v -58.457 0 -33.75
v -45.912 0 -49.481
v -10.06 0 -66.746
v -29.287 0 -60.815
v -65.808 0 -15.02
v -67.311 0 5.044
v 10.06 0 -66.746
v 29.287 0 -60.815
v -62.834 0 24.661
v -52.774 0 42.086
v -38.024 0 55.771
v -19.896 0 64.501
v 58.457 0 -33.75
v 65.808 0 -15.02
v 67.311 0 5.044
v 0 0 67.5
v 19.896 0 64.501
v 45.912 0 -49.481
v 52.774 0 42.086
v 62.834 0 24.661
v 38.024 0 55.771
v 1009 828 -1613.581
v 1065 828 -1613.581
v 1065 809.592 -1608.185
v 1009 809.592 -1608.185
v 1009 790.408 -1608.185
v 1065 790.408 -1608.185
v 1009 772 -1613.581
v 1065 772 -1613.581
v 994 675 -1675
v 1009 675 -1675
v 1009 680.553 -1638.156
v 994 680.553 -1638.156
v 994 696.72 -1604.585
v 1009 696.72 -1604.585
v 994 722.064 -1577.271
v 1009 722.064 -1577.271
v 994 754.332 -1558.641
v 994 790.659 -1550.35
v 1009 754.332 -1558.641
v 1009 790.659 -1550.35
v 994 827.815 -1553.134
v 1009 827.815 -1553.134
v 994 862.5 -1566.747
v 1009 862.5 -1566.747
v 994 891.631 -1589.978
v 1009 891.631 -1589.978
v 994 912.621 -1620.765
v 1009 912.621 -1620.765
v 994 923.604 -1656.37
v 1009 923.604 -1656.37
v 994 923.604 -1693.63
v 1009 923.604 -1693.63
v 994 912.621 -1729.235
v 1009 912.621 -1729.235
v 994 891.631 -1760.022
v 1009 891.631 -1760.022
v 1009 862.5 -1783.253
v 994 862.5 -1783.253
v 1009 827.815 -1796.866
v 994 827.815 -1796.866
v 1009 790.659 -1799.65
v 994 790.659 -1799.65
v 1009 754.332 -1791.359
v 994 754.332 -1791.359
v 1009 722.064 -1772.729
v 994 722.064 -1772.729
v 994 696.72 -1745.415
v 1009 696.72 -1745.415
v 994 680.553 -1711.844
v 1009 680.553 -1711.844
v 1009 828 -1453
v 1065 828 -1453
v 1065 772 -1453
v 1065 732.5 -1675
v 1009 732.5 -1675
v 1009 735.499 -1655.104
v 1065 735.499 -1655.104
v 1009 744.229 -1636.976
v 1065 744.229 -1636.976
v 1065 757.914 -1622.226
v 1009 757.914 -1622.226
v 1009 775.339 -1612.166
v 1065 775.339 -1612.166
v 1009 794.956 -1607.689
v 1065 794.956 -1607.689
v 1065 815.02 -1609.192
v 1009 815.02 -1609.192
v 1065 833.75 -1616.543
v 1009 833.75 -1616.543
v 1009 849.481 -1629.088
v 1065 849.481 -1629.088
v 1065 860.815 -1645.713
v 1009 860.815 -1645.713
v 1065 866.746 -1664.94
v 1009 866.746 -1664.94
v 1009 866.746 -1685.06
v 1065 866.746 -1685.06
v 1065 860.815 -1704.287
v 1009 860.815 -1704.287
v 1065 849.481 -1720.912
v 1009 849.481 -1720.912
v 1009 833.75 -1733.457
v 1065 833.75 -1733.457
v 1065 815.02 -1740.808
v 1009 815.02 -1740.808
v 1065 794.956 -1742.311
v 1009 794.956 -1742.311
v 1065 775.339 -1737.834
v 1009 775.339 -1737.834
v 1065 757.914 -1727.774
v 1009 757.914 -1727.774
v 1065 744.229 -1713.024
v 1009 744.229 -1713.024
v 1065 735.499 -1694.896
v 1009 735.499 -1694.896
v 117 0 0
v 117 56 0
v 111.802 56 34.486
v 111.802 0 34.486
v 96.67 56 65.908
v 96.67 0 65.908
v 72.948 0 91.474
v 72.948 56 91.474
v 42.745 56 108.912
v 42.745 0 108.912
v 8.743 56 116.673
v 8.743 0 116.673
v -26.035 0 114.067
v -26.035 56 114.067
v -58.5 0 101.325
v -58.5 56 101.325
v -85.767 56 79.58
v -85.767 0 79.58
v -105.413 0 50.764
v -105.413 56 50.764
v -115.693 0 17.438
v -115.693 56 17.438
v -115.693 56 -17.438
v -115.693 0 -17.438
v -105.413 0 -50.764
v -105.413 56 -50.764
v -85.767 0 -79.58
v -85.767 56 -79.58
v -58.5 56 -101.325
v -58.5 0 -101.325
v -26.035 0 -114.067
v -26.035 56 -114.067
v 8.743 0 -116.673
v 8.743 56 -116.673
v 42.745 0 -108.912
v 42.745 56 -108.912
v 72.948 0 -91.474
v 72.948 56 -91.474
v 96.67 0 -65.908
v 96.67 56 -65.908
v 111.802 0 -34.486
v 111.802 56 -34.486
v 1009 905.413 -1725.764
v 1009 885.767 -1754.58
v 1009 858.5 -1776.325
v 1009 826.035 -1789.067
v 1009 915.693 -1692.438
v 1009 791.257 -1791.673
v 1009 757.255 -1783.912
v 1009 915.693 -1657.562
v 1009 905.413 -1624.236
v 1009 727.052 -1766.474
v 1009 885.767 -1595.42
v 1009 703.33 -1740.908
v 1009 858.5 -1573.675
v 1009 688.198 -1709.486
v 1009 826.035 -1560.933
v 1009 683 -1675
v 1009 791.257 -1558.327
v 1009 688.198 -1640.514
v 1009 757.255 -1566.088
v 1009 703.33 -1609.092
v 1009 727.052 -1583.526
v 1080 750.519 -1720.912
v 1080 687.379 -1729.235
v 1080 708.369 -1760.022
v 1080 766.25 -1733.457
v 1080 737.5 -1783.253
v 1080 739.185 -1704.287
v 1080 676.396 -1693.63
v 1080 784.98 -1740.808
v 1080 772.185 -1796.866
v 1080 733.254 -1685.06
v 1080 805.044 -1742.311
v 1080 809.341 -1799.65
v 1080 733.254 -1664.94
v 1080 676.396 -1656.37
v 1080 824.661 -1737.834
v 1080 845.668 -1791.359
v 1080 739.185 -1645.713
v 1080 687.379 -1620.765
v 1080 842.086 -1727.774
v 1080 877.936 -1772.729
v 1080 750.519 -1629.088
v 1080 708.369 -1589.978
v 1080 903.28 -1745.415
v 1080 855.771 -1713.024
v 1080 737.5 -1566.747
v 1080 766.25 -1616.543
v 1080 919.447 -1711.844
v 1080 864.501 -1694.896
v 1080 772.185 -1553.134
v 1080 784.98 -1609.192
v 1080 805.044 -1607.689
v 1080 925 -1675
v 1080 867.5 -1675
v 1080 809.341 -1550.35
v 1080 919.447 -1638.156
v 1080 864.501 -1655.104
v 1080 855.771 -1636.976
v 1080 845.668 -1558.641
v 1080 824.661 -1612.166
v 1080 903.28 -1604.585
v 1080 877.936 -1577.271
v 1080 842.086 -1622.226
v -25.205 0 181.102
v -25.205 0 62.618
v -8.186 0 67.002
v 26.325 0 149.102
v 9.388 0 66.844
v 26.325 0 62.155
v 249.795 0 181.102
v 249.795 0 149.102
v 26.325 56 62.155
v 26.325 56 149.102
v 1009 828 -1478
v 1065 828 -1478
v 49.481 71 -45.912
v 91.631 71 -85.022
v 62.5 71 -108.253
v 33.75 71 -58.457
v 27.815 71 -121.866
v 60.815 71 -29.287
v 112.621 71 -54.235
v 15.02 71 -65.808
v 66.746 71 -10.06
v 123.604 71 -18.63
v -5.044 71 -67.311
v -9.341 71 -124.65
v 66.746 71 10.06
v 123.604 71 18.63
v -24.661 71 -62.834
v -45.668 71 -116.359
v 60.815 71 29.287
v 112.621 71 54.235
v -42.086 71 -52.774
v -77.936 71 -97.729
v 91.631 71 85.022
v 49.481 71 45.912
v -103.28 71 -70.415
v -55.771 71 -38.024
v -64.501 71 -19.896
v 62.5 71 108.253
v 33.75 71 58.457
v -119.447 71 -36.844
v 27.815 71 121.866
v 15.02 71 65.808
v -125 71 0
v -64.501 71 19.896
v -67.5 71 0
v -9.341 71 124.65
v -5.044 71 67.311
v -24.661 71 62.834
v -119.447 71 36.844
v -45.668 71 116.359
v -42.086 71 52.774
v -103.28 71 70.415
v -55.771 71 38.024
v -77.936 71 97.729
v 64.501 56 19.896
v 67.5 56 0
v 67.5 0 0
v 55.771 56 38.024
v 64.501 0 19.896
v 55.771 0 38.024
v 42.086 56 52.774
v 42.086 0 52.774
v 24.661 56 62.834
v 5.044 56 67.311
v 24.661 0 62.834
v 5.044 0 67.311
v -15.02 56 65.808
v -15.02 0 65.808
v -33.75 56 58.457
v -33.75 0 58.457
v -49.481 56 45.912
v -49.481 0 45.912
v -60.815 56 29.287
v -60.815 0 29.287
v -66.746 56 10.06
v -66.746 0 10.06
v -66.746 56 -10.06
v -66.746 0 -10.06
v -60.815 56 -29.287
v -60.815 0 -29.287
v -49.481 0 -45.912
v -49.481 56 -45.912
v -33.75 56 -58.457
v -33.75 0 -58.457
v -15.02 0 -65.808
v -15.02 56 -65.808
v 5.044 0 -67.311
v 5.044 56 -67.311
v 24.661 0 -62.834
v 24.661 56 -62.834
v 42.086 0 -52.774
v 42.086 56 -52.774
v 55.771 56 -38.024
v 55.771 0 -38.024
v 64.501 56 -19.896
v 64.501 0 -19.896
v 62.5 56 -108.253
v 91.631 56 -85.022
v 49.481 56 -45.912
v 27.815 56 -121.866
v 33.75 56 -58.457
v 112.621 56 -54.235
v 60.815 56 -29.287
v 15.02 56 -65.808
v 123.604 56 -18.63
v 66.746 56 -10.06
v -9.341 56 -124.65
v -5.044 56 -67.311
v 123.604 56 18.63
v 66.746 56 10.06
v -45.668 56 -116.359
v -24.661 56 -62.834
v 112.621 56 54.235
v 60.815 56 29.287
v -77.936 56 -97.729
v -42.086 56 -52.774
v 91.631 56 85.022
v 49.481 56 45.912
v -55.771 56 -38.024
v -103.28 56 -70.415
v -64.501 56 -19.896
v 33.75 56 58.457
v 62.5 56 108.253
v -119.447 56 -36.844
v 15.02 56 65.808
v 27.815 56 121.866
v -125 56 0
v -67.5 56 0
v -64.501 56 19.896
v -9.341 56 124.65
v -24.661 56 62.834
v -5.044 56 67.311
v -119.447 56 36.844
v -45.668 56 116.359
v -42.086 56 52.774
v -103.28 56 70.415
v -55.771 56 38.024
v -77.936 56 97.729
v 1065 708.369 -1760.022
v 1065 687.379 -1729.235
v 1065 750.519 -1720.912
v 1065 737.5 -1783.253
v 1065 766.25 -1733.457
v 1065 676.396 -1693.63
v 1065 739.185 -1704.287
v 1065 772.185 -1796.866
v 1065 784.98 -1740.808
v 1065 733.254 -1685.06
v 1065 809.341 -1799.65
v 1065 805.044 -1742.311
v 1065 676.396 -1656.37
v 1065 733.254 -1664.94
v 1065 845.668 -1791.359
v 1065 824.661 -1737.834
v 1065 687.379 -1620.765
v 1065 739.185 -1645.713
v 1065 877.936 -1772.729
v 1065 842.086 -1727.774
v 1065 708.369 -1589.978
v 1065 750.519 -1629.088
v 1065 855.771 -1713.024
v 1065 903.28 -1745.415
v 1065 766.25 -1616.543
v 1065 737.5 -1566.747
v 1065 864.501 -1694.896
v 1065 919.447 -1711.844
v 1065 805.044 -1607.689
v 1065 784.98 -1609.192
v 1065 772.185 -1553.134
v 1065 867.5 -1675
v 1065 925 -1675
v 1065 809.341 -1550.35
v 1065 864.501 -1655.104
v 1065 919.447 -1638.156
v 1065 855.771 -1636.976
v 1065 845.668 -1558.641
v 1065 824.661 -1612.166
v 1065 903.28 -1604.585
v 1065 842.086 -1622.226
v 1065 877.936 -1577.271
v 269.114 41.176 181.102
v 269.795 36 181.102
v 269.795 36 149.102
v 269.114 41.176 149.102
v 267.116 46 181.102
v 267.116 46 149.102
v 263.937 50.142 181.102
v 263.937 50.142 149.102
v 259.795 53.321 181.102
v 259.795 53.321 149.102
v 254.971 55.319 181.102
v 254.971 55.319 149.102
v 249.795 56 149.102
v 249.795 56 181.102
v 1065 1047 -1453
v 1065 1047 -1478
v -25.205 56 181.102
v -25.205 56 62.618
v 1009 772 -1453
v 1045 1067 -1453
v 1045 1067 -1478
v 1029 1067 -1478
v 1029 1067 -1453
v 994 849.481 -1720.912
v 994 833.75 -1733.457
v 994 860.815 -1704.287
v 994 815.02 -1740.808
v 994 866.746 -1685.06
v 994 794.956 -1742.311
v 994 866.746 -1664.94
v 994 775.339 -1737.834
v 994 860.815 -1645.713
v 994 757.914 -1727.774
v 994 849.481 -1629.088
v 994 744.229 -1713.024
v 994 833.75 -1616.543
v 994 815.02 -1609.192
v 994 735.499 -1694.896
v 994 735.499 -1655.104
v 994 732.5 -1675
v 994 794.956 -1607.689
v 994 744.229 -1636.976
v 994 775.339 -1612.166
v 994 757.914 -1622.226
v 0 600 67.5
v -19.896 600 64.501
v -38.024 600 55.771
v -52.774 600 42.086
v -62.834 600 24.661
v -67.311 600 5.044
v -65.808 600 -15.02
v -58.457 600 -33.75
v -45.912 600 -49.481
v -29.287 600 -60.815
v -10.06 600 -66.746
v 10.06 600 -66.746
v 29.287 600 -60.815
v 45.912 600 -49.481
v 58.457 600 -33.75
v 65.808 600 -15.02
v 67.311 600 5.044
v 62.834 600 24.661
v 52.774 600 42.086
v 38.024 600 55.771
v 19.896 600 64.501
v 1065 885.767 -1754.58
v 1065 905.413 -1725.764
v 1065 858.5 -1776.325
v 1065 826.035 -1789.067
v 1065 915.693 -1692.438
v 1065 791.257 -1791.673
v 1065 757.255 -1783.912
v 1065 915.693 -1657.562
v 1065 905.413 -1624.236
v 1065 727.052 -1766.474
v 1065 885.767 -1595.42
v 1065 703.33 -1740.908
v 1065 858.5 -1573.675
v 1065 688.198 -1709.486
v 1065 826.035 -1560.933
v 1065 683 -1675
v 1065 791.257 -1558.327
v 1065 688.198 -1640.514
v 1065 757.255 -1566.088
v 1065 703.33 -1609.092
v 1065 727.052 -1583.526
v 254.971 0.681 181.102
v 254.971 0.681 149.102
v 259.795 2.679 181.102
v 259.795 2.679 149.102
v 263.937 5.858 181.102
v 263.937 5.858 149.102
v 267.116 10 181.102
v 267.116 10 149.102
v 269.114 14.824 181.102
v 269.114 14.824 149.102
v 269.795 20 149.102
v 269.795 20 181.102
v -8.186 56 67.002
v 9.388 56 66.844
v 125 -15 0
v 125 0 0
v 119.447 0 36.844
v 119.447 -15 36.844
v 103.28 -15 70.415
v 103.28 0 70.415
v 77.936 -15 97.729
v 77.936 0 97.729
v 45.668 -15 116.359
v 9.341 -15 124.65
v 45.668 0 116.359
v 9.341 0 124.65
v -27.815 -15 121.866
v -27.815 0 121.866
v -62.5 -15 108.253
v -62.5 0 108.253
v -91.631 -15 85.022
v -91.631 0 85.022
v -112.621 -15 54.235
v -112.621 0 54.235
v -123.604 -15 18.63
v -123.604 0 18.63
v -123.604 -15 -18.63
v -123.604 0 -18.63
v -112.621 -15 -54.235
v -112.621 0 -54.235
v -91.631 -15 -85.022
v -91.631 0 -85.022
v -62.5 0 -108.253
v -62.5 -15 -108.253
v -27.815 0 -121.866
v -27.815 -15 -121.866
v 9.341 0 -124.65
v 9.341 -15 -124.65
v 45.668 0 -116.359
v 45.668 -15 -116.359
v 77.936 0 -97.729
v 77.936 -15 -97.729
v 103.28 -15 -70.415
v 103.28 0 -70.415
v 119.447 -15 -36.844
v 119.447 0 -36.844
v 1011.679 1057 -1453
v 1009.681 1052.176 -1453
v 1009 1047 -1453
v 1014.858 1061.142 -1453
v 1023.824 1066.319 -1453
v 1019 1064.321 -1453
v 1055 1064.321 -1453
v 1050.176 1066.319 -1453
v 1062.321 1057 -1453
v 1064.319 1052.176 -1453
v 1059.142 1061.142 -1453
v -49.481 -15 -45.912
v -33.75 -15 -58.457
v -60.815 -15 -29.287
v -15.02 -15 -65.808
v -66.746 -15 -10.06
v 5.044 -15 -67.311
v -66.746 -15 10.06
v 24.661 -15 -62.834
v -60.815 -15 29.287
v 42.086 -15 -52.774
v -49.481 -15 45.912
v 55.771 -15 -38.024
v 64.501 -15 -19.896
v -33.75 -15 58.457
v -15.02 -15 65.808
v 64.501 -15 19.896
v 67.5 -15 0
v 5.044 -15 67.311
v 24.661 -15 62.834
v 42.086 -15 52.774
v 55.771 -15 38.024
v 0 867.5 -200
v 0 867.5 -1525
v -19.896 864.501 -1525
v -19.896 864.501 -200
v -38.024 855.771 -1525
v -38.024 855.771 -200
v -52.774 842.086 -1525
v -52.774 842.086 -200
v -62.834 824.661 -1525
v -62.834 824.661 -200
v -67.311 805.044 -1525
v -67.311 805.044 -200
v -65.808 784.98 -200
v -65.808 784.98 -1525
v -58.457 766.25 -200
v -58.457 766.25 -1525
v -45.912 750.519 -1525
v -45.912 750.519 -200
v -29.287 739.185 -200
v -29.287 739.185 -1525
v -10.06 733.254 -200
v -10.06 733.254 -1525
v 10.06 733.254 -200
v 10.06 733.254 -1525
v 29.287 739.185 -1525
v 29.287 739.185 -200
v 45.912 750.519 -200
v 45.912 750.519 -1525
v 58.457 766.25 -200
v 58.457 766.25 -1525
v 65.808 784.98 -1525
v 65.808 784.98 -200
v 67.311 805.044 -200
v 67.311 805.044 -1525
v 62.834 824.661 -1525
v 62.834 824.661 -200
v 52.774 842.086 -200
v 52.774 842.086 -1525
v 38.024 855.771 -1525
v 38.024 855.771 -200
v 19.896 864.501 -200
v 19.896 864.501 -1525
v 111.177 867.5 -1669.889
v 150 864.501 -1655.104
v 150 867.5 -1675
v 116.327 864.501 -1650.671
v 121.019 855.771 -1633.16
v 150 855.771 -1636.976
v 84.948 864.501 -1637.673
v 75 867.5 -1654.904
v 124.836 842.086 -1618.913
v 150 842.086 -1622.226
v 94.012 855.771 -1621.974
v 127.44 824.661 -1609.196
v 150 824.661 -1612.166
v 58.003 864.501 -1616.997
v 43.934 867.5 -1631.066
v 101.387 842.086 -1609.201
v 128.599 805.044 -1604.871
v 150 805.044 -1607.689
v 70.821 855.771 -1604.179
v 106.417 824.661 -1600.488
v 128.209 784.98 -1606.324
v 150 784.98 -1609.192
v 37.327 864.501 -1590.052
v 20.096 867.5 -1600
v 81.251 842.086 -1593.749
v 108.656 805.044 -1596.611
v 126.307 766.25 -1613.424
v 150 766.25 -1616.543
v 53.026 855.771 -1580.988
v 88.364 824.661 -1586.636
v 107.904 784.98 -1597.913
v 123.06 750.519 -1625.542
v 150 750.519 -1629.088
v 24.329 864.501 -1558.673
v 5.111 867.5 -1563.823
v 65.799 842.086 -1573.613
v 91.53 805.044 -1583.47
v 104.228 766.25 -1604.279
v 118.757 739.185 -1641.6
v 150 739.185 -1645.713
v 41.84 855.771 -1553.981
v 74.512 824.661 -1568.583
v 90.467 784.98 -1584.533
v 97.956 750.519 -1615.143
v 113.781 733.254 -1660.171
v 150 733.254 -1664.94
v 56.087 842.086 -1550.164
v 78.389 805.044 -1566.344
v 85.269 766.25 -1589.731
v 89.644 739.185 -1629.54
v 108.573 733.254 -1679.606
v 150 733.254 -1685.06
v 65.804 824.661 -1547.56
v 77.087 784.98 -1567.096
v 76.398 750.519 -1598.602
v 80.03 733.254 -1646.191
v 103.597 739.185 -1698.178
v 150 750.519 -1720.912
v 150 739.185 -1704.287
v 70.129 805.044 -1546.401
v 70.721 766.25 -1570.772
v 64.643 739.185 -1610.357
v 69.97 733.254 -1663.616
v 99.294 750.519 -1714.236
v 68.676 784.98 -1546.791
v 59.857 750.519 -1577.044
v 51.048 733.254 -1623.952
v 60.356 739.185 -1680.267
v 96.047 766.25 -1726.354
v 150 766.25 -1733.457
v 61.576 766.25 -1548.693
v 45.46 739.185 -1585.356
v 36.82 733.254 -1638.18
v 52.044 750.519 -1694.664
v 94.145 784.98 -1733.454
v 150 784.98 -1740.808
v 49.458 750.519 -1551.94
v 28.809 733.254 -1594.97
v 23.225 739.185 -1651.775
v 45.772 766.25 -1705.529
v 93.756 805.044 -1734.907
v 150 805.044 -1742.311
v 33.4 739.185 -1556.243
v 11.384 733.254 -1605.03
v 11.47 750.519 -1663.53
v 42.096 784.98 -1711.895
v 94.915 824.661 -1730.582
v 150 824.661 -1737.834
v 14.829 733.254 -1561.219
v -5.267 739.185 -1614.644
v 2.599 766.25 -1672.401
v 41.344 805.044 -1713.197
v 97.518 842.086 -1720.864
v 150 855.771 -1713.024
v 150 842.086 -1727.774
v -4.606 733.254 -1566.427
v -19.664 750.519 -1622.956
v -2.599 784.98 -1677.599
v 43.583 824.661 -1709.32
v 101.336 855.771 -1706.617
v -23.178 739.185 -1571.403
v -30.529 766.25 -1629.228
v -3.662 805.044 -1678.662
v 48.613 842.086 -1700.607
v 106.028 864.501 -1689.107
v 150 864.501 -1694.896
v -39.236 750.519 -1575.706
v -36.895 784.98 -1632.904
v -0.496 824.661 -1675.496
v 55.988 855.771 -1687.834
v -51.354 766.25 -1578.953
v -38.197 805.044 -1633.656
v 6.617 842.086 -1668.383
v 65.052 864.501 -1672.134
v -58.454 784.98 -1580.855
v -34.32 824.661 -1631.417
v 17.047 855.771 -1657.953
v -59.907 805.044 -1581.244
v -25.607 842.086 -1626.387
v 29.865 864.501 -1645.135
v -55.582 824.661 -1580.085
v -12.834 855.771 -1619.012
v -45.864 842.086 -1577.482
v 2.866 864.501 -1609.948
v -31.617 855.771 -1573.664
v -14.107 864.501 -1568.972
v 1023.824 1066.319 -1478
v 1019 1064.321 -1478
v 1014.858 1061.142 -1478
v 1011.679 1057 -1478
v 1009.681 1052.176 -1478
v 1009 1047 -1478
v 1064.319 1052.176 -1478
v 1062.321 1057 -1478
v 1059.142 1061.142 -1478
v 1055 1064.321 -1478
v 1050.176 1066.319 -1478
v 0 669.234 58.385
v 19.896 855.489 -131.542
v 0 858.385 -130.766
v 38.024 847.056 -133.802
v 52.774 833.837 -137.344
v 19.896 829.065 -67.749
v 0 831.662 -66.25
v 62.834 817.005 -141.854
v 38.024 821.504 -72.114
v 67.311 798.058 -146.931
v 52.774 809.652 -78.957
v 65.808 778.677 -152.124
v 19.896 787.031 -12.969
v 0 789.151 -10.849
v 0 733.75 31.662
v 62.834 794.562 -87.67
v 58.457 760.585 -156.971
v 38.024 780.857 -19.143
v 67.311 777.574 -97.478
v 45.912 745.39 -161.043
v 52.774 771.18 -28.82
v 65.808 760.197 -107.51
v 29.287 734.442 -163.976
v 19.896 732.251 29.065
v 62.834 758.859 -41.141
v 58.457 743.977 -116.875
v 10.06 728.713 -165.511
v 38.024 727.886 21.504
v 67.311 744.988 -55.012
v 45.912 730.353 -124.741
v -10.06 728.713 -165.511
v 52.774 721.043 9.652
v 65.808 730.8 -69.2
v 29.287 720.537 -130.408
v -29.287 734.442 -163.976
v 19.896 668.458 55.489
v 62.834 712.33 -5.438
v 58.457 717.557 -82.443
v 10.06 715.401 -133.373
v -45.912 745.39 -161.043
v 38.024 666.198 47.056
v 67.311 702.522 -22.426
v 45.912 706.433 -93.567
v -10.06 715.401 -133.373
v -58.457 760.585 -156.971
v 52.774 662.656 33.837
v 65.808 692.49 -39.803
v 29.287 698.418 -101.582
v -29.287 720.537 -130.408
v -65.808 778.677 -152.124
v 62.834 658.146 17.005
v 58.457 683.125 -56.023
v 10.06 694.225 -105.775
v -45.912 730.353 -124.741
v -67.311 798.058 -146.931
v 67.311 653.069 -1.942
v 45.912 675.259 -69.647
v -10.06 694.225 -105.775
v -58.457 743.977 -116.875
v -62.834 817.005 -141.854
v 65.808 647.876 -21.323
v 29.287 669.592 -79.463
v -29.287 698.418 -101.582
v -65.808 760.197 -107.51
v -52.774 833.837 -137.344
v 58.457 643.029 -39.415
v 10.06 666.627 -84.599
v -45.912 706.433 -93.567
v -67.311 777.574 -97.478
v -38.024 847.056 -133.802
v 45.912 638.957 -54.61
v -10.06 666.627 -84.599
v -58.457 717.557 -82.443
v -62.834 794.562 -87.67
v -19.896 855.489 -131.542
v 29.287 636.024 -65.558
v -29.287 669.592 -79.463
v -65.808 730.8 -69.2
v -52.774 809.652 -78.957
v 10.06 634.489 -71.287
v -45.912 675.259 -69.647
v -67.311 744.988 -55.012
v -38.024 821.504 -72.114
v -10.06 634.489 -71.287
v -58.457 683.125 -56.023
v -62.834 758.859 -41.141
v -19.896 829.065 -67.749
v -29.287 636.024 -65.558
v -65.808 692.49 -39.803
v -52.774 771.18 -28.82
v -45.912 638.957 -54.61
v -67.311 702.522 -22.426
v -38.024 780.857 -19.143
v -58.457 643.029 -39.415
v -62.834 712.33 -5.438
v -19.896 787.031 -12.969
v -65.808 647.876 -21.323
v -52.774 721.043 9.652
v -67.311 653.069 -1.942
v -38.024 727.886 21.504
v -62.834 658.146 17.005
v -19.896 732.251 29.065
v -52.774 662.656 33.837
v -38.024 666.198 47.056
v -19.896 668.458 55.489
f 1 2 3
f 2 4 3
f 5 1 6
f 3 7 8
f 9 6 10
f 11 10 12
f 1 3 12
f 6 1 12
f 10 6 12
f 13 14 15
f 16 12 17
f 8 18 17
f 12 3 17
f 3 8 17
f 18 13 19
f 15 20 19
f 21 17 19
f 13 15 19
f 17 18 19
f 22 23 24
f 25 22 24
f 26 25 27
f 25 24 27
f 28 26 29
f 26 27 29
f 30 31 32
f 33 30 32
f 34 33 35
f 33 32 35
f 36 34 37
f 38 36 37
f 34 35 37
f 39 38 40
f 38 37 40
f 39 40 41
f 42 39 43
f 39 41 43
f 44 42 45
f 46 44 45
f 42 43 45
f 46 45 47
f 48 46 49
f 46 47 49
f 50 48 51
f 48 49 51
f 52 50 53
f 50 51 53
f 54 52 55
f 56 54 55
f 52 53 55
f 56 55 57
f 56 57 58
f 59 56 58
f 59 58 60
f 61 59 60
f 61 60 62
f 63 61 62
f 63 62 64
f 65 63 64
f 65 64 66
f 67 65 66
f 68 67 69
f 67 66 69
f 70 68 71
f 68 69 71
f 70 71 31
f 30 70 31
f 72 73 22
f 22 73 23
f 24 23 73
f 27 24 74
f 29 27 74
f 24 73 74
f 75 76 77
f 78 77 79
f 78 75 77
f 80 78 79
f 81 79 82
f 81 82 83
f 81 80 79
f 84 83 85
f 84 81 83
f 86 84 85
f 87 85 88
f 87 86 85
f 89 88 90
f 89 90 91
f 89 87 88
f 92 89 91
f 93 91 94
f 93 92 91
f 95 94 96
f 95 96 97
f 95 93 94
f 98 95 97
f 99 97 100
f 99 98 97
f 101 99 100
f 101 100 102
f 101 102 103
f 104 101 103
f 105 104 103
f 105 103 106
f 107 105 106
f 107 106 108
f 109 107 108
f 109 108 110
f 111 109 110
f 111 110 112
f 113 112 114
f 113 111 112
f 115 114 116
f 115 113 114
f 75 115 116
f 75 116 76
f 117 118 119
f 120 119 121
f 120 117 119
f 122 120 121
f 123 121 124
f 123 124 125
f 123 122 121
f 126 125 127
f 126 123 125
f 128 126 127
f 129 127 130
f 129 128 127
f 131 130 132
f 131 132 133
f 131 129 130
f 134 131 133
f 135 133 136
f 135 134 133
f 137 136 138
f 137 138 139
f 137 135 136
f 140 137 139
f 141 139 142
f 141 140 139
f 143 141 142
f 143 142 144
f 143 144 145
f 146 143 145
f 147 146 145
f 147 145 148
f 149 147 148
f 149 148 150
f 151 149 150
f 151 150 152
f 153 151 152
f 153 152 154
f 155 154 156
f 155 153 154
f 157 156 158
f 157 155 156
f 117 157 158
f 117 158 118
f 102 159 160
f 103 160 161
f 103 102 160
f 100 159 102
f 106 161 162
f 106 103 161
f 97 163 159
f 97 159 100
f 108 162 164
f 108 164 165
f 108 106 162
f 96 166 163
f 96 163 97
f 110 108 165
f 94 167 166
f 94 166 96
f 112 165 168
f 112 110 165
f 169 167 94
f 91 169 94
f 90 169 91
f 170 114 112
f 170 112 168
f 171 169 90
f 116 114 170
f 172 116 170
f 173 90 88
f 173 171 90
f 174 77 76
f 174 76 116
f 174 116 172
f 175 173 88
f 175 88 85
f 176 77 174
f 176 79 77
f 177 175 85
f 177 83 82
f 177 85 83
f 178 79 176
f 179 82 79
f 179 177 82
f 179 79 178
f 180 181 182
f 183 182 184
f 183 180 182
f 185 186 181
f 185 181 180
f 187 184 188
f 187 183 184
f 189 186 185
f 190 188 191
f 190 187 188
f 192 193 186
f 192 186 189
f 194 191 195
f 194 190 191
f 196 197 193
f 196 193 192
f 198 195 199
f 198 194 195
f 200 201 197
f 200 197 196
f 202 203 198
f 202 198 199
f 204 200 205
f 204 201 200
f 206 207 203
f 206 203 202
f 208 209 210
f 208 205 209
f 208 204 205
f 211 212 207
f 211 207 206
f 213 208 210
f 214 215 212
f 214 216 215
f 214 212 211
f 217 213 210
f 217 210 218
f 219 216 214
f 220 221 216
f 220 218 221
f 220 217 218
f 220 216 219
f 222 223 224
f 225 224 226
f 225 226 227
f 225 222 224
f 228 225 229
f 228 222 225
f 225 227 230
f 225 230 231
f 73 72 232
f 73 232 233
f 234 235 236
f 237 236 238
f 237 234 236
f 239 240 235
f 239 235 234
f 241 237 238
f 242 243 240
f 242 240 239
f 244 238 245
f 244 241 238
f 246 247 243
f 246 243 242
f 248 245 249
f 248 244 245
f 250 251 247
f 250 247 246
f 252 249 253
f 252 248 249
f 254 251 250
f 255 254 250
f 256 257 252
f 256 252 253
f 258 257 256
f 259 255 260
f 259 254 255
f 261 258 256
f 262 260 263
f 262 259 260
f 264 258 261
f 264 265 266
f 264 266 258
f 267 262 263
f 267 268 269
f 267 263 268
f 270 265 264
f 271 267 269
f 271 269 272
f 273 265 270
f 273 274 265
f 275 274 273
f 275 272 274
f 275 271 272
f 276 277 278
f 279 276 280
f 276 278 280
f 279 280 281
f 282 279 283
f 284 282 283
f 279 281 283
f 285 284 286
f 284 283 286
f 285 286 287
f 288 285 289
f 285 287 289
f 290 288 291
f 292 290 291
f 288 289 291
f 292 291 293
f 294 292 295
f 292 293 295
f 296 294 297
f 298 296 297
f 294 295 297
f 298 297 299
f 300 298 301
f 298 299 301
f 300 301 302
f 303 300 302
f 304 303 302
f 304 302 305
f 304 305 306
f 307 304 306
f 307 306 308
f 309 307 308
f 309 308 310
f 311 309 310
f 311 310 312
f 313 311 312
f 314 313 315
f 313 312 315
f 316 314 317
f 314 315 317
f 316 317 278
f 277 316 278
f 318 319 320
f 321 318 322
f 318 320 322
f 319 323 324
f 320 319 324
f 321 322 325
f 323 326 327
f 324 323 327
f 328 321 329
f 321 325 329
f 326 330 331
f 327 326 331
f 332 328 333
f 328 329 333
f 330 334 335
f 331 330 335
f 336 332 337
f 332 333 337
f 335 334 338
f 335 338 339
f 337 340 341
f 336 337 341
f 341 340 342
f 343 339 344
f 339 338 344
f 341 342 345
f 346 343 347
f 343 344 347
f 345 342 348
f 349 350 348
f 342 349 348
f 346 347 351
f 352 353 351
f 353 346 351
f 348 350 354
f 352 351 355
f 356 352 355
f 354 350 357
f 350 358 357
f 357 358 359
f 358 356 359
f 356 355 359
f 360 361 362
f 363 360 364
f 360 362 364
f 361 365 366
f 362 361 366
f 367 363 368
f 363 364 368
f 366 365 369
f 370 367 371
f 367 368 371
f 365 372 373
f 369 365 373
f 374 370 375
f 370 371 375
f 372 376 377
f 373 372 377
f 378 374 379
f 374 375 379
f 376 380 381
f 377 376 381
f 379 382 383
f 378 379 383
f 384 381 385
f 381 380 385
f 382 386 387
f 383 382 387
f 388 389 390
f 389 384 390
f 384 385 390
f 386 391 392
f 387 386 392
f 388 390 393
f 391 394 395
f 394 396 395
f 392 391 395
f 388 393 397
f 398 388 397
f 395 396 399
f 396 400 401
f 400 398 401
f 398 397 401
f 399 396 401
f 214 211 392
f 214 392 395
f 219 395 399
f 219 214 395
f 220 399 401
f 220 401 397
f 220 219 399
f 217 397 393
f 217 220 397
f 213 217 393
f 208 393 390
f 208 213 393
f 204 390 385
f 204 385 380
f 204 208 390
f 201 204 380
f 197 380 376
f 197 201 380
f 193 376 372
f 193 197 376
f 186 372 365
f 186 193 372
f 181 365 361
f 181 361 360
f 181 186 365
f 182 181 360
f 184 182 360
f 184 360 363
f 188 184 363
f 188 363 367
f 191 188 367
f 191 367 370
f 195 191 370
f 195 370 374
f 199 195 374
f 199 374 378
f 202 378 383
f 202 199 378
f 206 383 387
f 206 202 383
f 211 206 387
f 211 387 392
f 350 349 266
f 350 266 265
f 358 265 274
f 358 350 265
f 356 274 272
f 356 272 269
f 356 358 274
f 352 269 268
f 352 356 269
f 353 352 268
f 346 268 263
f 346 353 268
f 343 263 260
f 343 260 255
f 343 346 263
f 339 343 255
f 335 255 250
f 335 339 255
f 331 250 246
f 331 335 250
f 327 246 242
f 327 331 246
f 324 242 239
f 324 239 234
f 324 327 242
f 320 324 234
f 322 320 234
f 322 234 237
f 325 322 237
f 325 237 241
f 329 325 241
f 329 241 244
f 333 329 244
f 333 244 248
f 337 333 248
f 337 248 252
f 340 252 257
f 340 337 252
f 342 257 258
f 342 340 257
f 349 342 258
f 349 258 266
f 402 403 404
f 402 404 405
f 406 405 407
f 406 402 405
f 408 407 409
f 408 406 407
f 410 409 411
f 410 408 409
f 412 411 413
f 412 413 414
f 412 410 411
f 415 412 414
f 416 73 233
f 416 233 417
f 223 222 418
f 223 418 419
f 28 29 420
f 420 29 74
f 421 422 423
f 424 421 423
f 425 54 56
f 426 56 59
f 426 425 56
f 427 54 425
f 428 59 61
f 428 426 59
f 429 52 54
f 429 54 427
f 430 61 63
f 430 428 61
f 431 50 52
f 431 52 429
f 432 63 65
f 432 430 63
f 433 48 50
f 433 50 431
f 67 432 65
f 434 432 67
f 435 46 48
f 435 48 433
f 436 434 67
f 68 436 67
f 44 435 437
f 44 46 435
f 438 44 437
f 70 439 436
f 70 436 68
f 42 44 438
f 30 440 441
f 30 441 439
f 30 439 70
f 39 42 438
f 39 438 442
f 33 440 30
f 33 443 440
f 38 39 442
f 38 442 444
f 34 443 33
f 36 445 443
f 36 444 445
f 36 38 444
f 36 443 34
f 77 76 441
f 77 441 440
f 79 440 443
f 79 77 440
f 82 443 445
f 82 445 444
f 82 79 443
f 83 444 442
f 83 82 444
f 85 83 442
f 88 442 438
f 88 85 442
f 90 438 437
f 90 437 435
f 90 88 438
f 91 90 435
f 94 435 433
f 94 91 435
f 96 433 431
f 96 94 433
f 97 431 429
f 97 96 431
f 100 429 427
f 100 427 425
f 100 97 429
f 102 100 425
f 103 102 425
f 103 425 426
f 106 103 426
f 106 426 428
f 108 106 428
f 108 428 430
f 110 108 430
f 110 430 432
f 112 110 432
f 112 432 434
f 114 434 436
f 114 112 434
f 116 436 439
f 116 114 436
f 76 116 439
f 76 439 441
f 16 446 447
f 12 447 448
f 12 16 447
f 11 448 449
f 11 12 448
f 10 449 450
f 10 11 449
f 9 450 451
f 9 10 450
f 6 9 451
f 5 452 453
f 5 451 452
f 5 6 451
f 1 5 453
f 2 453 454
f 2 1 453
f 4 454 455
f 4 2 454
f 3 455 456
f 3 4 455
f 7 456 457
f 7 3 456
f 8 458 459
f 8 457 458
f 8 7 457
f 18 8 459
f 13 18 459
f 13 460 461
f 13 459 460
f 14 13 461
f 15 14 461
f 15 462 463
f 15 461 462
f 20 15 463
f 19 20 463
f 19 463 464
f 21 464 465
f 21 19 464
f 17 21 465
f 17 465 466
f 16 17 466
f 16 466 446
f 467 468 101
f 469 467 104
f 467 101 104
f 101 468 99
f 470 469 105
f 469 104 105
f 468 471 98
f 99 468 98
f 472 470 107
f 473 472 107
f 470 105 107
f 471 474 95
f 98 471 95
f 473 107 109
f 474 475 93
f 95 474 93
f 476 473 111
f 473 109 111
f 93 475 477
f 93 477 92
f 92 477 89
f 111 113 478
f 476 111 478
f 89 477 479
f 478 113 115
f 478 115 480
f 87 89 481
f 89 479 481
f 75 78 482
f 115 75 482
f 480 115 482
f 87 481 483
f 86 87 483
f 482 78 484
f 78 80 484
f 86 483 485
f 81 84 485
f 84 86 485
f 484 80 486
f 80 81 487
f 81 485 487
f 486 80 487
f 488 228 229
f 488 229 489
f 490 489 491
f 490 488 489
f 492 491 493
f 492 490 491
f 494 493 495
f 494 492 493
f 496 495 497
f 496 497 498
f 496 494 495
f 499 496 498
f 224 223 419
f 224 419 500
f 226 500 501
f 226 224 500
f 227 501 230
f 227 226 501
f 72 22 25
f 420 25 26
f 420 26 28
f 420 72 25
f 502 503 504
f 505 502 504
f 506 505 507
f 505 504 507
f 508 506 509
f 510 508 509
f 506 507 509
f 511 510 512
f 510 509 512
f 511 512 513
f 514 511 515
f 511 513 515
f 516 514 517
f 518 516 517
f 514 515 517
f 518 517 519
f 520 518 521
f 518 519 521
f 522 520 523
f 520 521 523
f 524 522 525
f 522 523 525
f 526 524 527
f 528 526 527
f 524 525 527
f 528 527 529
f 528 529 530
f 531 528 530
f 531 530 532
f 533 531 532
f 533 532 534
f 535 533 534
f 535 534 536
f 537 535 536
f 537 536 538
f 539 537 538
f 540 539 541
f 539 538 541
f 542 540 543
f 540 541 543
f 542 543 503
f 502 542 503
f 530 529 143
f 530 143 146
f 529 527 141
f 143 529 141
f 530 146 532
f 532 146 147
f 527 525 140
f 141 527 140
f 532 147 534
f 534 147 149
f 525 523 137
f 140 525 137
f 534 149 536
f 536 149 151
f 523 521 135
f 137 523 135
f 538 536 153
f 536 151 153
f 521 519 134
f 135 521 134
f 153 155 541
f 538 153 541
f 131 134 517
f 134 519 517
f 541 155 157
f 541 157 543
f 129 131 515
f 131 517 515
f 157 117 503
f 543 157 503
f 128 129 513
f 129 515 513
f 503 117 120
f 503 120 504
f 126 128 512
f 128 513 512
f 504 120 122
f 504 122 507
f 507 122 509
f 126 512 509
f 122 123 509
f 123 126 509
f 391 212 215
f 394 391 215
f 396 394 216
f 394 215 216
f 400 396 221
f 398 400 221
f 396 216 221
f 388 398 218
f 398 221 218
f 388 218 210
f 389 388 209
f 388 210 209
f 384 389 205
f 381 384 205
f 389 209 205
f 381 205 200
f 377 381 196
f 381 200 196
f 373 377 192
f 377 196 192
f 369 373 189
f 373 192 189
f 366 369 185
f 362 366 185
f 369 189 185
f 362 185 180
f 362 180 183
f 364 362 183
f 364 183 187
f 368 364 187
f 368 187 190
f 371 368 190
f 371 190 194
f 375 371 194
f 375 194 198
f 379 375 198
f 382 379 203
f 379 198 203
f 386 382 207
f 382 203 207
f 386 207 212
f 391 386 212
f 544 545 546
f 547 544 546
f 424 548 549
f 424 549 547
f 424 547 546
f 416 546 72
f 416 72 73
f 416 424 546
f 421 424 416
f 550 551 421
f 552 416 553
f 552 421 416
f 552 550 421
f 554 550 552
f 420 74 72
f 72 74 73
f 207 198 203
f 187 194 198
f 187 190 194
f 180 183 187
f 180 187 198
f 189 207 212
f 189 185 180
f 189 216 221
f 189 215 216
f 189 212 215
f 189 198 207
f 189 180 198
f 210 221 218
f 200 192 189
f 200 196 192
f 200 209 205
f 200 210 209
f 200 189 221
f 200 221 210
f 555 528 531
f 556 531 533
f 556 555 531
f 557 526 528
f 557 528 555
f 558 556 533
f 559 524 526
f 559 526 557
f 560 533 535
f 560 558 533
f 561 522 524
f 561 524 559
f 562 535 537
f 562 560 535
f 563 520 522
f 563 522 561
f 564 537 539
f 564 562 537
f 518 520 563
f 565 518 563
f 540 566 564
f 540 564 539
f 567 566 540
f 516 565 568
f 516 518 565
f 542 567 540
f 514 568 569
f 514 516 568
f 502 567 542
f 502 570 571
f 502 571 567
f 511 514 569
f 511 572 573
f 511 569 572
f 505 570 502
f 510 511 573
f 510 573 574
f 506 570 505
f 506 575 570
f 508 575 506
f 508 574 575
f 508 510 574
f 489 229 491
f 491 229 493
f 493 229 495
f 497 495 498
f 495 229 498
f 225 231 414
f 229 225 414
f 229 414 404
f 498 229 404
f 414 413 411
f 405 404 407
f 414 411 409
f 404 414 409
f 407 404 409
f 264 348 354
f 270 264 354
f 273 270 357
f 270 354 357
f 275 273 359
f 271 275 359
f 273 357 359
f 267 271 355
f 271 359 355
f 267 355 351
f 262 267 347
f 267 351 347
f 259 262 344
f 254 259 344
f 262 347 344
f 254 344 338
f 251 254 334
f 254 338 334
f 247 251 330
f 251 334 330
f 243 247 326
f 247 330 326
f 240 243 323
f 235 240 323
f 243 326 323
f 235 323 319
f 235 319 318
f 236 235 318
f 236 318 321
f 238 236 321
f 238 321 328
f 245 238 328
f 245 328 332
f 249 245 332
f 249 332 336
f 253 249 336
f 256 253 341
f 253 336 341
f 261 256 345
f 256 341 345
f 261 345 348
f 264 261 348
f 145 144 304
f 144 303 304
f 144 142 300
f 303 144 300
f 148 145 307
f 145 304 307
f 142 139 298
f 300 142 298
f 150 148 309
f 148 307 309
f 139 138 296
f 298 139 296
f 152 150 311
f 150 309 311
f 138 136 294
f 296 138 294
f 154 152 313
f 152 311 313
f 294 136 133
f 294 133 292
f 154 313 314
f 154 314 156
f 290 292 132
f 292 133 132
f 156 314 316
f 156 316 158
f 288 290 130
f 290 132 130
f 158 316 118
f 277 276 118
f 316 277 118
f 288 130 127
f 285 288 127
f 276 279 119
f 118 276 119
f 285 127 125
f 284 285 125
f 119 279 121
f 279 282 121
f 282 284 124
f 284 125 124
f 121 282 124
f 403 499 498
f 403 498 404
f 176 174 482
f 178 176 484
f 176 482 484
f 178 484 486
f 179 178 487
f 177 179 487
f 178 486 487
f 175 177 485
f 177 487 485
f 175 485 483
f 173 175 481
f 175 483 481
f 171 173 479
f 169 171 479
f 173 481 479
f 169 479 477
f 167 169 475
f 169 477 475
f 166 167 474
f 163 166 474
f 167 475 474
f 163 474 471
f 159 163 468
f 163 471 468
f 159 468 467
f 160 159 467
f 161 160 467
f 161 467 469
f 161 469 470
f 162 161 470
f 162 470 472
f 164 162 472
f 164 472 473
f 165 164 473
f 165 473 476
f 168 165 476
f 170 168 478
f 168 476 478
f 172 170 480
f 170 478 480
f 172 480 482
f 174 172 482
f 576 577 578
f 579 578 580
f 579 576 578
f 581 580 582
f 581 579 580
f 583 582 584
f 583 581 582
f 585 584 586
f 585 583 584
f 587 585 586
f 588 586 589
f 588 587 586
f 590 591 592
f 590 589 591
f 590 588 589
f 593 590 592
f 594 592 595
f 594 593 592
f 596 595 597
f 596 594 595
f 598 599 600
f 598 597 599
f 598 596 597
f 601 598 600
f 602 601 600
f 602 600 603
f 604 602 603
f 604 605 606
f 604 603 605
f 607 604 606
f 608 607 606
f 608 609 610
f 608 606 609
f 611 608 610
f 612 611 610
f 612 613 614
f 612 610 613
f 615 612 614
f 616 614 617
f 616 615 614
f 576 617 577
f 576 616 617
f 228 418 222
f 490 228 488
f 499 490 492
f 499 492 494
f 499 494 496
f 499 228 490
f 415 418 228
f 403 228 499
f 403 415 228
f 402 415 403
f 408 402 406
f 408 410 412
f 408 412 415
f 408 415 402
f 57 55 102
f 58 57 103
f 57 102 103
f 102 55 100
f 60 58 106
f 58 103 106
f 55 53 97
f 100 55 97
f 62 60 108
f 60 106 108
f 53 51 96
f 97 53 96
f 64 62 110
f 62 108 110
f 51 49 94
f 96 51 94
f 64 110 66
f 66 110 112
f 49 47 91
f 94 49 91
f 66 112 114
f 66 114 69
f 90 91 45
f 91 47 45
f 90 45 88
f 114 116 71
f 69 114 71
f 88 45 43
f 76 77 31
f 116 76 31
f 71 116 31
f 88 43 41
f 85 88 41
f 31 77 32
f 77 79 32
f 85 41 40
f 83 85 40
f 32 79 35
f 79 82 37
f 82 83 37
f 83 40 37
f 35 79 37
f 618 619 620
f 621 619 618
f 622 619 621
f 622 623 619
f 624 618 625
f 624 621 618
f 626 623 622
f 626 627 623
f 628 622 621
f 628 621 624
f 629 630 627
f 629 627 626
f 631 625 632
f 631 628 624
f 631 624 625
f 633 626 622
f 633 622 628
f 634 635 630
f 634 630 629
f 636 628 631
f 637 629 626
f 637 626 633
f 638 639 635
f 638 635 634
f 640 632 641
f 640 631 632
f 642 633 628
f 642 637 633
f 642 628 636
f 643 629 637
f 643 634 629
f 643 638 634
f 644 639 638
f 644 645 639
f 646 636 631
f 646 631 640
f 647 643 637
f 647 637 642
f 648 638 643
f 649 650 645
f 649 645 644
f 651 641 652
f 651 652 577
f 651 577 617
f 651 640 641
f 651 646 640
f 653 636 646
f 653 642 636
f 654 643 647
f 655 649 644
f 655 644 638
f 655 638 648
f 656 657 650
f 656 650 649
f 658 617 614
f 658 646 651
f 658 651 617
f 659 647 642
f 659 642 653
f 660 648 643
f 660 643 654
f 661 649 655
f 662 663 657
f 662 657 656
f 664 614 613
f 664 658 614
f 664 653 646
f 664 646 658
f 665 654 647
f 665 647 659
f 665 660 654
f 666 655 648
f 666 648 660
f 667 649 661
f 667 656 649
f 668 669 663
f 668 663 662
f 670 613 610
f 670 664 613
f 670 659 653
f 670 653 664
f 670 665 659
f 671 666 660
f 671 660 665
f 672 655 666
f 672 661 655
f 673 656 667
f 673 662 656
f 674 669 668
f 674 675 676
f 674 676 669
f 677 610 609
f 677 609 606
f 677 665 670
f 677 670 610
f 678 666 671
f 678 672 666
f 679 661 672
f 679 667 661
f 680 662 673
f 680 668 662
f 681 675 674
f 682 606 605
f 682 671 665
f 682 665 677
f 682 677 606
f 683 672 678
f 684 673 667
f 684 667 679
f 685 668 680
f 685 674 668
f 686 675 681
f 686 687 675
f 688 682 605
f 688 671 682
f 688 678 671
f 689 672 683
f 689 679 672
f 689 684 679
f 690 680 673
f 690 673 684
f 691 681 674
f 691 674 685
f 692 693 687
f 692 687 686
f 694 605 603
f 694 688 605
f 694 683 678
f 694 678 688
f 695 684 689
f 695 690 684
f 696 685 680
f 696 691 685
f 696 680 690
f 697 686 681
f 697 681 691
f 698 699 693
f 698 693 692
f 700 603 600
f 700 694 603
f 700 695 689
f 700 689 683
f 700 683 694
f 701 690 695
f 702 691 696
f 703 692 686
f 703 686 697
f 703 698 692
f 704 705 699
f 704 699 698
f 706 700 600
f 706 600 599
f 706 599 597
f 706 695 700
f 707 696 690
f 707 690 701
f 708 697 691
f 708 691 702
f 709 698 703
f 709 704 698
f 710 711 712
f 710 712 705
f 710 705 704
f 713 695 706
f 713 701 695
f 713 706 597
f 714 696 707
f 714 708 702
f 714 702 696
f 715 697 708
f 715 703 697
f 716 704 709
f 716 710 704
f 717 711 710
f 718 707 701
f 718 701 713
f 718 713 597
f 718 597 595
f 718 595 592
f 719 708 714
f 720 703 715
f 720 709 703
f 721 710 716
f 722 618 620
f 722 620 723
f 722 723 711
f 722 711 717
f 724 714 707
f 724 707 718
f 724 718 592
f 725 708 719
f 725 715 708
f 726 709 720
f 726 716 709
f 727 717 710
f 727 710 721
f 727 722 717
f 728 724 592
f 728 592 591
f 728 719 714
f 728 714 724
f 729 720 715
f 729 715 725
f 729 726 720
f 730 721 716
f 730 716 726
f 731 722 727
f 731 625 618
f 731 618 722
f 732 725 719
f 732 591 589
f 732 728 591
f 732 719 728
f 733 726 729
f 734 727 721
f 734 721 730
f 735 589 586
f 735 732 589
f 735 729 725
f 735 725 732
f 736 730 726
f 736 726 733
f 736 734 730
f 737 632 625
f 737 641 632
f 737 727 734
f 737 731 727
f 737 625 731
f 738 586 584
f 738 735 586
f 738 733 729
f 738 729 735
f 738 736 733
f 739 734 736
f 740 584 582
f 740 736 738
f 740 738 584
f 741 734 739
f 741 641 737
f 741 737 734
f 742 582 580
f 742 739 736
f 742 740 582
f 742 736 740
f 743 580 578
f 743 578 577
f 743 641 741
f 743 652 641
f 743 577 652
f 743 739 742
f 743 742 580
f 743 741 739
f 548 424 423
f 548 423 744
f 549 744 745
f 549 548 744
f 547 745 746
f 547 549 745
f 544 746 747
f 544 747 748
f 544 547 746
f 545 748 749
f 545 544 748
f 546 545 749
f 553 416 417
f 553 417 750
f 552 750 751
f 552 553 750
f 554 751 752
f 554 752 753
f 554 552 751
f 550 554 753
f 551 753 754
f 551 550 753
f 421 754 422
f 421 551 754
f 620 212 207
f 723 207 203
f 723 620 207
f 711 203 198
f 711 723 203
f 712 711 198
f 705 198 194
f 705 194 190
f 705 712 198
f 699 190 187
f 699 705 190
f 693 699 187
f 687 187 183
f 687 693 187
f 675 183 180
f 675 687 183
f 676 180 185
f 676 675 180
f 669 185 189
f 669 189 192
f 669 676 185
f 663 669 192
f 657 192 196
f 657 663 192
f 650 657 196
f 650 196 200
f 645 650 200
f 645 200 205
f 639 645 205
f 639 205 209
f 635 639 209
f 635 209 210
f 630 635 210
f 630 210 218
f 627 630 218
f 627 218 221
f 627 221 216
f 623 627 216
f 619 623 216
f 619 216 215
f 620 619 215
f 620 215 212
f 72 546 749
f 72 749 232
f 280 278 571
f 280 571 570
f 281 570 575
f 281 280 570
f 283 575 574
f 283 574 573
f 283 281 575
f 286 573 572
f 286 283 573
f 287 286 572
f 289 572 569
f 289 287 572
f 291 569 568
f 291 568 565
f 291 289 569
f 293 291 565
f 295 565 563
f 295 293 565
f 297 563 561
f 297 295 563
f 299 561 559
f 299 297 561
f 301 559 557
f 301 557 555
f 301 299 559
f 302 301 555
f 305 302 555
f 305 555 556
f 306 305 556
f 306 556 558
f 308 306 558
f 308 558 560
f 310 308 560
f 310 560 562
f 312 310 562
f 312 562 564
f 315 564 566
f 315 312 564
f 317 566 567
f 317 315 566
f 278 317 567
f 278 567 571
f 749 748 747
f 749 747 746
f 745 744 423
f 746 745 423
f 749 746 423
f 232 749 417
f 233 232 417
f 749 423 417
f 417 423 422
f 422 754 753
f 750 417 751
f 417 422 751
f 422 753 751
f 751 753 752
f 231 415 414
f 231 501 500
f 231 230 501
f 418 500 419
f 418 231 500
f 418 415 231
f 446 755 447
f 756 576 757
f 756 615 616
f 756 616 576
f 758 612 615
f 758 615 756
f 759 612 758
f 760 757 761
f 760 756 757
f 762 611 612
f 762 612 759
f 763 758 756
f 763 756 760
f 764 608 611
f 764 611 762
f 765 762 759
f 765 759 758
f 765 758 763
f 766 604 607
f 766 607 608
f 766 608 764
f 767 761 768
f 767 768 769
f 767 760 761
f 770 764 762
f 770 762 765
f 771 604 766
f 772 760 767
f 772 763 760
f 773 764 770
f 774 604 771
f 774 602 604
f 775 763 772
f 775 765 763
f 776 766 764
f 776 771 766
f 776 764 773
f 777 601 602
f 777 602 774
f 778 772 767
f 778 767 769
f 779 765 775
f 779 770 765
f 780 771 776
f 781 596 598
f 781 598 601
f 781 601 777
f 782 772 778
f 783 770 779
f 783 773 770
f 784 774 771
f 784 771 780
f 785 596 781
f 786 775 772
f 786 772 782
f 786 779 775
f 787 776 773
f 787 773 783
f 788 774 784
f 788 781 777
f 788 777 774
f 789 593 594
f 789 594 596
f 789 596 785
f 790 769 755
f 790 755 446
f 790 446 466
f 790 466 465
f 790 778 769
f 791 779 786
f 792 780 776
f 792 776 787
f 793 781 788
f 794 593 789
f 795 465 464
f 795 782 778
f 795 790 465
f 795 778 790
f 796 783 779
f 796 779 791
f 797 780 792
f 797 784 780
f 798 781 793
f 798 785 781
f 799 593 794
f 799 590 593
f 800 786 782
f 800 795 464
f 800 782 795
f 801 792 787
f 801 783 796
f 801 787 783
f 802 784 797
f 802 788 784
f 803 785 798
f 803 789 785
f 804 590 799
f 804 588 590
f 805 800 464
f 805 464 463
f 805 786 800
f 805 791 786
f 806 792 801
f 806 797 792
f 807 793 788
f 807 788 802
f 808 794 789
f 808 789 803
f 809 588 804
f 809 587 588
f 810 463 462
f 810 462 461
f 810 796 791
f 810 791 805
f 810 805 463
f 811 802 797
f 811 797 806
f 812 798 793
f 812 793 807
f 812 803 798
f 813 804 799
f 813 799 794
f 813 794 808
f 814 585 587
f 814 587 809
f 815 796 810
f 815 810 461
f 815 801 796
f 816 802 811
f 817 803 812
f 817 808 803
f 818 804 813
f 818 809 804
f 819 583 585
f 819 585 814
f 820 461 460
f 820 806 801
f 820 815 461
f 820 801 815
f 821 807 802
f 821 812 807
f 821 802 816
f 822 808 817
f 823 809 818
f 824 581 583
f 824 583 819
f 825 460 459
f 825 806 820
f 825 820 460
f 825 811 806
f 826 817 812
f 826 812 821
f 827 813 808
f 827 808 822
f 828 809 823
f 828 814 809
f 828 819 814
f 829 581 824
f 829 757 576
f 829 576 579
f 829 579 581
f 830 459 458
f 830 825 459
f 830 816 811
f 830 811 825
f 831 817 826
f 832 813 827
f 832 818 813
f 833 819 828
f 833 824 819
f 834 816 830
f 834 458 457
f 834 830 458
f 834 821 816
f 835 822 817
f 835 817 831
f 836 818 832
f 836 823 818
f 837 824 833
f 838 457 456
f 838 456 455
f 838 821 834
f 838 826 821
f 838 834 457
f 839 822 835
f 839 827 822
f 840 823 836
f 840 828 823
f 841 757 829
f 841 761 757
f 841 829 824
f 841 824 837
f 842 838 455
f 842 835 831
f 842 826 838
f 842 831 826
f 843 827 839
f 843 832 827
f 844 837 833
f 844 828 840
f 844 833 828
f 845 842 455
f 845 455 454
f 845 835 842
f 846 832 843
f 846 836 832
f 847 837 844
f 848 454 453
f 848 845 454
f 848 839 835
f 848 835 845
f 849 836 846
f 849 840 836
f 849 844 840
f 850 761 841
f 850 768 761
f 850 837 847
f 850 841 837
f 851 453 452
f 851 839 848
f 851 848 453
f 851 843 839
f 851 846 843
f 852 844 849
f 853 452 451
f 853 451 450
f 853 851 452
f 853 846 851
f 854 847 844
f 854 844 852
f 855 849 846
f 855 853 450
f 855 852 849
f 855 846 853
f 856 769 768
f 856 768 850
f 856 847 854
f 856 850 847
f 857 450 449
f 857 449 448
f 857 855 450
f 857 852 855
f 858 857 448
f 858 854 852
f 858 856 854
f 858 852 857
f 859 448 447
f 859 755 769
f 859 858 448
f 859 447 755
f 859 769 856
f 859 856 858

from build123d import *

# Parameters (mm, degrees)
F0_R      = 125
F0_R_2    = 67.5
F6_DEPTH  = 15
F5_R      = 125
F5_R_2    = 67.5
F7_DEPTH  = 15
F8_R      = 117
F8_R_2    = 67.5
F9_DEPTH  = 56
F10_R     = 125
F10_R_2   = 117
F10_R_3   = 67.5
F11_DEPTH = 15
F13_DEPTH = 56
F15_DEPTH = 32
F16_R     = 117
F16_R_2   = 67.5
F17_DEPTH = 56
F18_R     = 125
F18_R_2   = 117
F18_R_3   = 67.5
F19_DEPTH = 15
F21_DEPTH = 56
F23_DEPTH = 25


with BuildPart() as f6:
    # F0 (on Front) → F6 (new body)
    with BuildSketch(Plane.XZ):
        Circle(F0_R)
        Circle(F0_R_2, mode=Mode.SUBTRACT)
    extrude(amount=F6_DEPTH)

    # F8 (on face) → F9 (join)
    with BuildSketch(Plane.XZ):
        Circle(F8_R)
        Circle(F8_R_2, mode=Mode.SUBTRACT)
    extrude(amount=-F9_DEPTH)


with BuildPart() as f7:
    # F5 (on offset) → F7 (new body)
    with BuildSketch(Plane.YZ.offset(1080)):
        with Locations((800, -1675)):
            Circle(F5_R)
        with Locations((800, -1675)):
            Circle(F5_R_2, mode=Mode.SUBTRACT)
    extrude(amount=-F7_DEPTH)


with BuildPart() as f11:
    # F10 (on face) → F11 (new body)
    with BuildSketch(Plane(origin=(0, 56, 0), x_dir=(-1, 0, 0), z_dir=(0, 1, 0))):
        Circle(F10_R)
        Circle(F10_R_2, mode=Mode.SUBTRACT)
        Circle(F10_R_2)
        Circle(F10_R_3, mode=Mode.SUBTRACT)
    extrude(amount=F11_DEPTH)


with BuildPart() as f13:
    # F12 (on face) → F13 (new body)
    with BuildSketch(Plane.XZ):
        with BuildLine():
            Line((26.3251196593, 122.1965141685), (26.3251196593, 181.1019480228))
            Line((26.3251196593, 181.1019480228), (-25.204917416, 181.1019480228))
            Line((-25.204917416, 181.1019480228), (-25.204917416, 122.4324799147))
            ThreePointArc((-25.204917416, 122.4324799147), (0.5723925444, 124.9986894602), (26.3251196593, 122.1965141685))
        make_face()
        with BuildLine():
            Line((26.3251196593, 62.1549521352), (26.3251196593, 122.1965141685))
            ThreePointArc((26.3251196593, 122.1965141685), (0.5723925444, 124.9986894602), (-25.204917416, 122.4324799147))
            Line((-25.204917416, 122.4324799147), (-25.204917416, 62.6175864918))
            ThreePointArc((-25.204917416, 62.6175864918), (0.605987544, 67.4972797903), (26.3251196593, 62.1549521352))
        make_face()
    extrude(amount=-F13_DEPTH)

    # F14 (on face) → F15 (join)
    with BuildSketch(Plane.XY.offset(181.1019480228)):
        with BuildLine():
            Line((249.795082584, 56), (26.3251196593, 56))
            Line((26.3251196593, 56), (26.3251196593, 0))
            Line((26.3251196593, 0), (249.795082584, 0))
            ThreePointArc((249.795082584, 0), (263.9372182078, 5.8578643763), (269.795082584, 20))
            Line((269.795082584, 20), (269.795082584, 36))
            ThreePointArc((269.795082584, 36), (263.9372182078, 50.1421356237), (249.795082584, 56))
        make_face()
    extrude(amount=-F15_DEPTH)


with BuildPart() as f17:
    # F16 (on face) → F17 (new body)
    with BuildSketch(Plane(origin=(1065, 0, 0), x_dir=(0, -1, 0), z_dir=(-1, 0, 0))):
        with Locations((-800, -1675)):
            Circle(F16_R)
        with Locations((-800, -1675)):
            Circle(F16_R_2, mode=Mode.SUBTRACT)
    extrude(amount=F17_DEPTH)


with BuildPart() as f19:
    # F18 (on face) → F19 (new body)
    with BuildSketch(Plane(origin=(1009, 0, 0), x_dir=(0, -1, 0), z_dir=(-1, 0, 0))):
        with Locations((-800, -1675)):
            Circle(F18_R)
        with Locations((-800, -1675)):
            Circle(F18_R_2, mode=Mode.SUBTRACT)
        with Locations((-800, -1675)):
            Circle(F18_R_2)
        with Locations((-800, -1675)):
            Circle(F18_R_3, mode=Mode.SUBTRACT)
    extrude(amount=F19_DEPTH)


with BuildPart() as f21:
    # F20 (on face) → F21 (new body)
    with BuildSketch(Plane(origin=(1065, 0, 0), x_dir=(0, -1, 0), z_dir=(-1, 0, 0))):
        with BuildLine():
            Line((-772, -1453), (-828, -1453))
            Line((-828, -1453), (-828, -1553.1763569745))
            ThreePointArc((-828, -1553.1763569745), (-800, -1550), (-772, -1553.1763569745))
            Line((-772, -1553.1763569745), (-772, -1453))
        make_face()
        with BuildLine():
            ThreePointArc((-772, -1553.1763569745), (-800, -1550), (-828, -1553.1763569745))
            Line((-828, -1553.1763569745), (-828, -1613.5813546226))
            ThreePointArc((-828, -1613.5813546226), (-800, -1607.5), (-772, -1613.5813546226))
            Line((-772, -1613.5813546226), (-772, -1553.1763569745))
        make_face()
    extrude(amount=F21_DEPTH)


with BuildPart() as f23:
    # F22 (on face) → F23 (new body)
    with BuildSketch(Plane.XY.offset(-1453)):
        with BuildLine():
            Line((1009, 1047), (1009, 828))
            Line((1009, 828), (1065, 828))
            Line((1065, 828), (1065, 1047))
            ThreePointArc((1065, 1047), (1059.1421356237, 1061.1421356237), (1045, 1067))
            Line((1045, 1067), (1029, 1067))
            ThreePointArc((1029, 1067), (1014.8578643763, 1061.1421356237), (1009, 1047))
        make_face()
    extrude(amount=-F23_DEPTH)


with BuildPart() as f24:
    # F24: sweep along a path in F3, F1
    with BuildLine(Plane.XZ.offset(-800)) as f24_path:
        Line((1080, -1675), (150, -1675))
        ThreePointArc((150, -1675), (43.933982822, -1631.066017178), (0, -1525))
        Line((0, -1525), (0, -200))
    with BuildLine(Plane.YZ) as f24_path_2:
        ThreePointArc((800, -200), (741.4213562373, -58.5786437627), (600, 0))
        Line((600, 0), (0, 0))
    # F5 (on offset) → F24 (sweep)
    with BuildSketch(Plane.YZ.offset(1080)):
        with Locations((800, -1675)):
            Circle(F5_R_2)
    sweep(path=f24_path.line + f24_path_2.line)


solid = Compound([f6.part, f7.part, f11.part, f13.part, f17.part, f19.part, f21.part, f23.part, f24.part])
